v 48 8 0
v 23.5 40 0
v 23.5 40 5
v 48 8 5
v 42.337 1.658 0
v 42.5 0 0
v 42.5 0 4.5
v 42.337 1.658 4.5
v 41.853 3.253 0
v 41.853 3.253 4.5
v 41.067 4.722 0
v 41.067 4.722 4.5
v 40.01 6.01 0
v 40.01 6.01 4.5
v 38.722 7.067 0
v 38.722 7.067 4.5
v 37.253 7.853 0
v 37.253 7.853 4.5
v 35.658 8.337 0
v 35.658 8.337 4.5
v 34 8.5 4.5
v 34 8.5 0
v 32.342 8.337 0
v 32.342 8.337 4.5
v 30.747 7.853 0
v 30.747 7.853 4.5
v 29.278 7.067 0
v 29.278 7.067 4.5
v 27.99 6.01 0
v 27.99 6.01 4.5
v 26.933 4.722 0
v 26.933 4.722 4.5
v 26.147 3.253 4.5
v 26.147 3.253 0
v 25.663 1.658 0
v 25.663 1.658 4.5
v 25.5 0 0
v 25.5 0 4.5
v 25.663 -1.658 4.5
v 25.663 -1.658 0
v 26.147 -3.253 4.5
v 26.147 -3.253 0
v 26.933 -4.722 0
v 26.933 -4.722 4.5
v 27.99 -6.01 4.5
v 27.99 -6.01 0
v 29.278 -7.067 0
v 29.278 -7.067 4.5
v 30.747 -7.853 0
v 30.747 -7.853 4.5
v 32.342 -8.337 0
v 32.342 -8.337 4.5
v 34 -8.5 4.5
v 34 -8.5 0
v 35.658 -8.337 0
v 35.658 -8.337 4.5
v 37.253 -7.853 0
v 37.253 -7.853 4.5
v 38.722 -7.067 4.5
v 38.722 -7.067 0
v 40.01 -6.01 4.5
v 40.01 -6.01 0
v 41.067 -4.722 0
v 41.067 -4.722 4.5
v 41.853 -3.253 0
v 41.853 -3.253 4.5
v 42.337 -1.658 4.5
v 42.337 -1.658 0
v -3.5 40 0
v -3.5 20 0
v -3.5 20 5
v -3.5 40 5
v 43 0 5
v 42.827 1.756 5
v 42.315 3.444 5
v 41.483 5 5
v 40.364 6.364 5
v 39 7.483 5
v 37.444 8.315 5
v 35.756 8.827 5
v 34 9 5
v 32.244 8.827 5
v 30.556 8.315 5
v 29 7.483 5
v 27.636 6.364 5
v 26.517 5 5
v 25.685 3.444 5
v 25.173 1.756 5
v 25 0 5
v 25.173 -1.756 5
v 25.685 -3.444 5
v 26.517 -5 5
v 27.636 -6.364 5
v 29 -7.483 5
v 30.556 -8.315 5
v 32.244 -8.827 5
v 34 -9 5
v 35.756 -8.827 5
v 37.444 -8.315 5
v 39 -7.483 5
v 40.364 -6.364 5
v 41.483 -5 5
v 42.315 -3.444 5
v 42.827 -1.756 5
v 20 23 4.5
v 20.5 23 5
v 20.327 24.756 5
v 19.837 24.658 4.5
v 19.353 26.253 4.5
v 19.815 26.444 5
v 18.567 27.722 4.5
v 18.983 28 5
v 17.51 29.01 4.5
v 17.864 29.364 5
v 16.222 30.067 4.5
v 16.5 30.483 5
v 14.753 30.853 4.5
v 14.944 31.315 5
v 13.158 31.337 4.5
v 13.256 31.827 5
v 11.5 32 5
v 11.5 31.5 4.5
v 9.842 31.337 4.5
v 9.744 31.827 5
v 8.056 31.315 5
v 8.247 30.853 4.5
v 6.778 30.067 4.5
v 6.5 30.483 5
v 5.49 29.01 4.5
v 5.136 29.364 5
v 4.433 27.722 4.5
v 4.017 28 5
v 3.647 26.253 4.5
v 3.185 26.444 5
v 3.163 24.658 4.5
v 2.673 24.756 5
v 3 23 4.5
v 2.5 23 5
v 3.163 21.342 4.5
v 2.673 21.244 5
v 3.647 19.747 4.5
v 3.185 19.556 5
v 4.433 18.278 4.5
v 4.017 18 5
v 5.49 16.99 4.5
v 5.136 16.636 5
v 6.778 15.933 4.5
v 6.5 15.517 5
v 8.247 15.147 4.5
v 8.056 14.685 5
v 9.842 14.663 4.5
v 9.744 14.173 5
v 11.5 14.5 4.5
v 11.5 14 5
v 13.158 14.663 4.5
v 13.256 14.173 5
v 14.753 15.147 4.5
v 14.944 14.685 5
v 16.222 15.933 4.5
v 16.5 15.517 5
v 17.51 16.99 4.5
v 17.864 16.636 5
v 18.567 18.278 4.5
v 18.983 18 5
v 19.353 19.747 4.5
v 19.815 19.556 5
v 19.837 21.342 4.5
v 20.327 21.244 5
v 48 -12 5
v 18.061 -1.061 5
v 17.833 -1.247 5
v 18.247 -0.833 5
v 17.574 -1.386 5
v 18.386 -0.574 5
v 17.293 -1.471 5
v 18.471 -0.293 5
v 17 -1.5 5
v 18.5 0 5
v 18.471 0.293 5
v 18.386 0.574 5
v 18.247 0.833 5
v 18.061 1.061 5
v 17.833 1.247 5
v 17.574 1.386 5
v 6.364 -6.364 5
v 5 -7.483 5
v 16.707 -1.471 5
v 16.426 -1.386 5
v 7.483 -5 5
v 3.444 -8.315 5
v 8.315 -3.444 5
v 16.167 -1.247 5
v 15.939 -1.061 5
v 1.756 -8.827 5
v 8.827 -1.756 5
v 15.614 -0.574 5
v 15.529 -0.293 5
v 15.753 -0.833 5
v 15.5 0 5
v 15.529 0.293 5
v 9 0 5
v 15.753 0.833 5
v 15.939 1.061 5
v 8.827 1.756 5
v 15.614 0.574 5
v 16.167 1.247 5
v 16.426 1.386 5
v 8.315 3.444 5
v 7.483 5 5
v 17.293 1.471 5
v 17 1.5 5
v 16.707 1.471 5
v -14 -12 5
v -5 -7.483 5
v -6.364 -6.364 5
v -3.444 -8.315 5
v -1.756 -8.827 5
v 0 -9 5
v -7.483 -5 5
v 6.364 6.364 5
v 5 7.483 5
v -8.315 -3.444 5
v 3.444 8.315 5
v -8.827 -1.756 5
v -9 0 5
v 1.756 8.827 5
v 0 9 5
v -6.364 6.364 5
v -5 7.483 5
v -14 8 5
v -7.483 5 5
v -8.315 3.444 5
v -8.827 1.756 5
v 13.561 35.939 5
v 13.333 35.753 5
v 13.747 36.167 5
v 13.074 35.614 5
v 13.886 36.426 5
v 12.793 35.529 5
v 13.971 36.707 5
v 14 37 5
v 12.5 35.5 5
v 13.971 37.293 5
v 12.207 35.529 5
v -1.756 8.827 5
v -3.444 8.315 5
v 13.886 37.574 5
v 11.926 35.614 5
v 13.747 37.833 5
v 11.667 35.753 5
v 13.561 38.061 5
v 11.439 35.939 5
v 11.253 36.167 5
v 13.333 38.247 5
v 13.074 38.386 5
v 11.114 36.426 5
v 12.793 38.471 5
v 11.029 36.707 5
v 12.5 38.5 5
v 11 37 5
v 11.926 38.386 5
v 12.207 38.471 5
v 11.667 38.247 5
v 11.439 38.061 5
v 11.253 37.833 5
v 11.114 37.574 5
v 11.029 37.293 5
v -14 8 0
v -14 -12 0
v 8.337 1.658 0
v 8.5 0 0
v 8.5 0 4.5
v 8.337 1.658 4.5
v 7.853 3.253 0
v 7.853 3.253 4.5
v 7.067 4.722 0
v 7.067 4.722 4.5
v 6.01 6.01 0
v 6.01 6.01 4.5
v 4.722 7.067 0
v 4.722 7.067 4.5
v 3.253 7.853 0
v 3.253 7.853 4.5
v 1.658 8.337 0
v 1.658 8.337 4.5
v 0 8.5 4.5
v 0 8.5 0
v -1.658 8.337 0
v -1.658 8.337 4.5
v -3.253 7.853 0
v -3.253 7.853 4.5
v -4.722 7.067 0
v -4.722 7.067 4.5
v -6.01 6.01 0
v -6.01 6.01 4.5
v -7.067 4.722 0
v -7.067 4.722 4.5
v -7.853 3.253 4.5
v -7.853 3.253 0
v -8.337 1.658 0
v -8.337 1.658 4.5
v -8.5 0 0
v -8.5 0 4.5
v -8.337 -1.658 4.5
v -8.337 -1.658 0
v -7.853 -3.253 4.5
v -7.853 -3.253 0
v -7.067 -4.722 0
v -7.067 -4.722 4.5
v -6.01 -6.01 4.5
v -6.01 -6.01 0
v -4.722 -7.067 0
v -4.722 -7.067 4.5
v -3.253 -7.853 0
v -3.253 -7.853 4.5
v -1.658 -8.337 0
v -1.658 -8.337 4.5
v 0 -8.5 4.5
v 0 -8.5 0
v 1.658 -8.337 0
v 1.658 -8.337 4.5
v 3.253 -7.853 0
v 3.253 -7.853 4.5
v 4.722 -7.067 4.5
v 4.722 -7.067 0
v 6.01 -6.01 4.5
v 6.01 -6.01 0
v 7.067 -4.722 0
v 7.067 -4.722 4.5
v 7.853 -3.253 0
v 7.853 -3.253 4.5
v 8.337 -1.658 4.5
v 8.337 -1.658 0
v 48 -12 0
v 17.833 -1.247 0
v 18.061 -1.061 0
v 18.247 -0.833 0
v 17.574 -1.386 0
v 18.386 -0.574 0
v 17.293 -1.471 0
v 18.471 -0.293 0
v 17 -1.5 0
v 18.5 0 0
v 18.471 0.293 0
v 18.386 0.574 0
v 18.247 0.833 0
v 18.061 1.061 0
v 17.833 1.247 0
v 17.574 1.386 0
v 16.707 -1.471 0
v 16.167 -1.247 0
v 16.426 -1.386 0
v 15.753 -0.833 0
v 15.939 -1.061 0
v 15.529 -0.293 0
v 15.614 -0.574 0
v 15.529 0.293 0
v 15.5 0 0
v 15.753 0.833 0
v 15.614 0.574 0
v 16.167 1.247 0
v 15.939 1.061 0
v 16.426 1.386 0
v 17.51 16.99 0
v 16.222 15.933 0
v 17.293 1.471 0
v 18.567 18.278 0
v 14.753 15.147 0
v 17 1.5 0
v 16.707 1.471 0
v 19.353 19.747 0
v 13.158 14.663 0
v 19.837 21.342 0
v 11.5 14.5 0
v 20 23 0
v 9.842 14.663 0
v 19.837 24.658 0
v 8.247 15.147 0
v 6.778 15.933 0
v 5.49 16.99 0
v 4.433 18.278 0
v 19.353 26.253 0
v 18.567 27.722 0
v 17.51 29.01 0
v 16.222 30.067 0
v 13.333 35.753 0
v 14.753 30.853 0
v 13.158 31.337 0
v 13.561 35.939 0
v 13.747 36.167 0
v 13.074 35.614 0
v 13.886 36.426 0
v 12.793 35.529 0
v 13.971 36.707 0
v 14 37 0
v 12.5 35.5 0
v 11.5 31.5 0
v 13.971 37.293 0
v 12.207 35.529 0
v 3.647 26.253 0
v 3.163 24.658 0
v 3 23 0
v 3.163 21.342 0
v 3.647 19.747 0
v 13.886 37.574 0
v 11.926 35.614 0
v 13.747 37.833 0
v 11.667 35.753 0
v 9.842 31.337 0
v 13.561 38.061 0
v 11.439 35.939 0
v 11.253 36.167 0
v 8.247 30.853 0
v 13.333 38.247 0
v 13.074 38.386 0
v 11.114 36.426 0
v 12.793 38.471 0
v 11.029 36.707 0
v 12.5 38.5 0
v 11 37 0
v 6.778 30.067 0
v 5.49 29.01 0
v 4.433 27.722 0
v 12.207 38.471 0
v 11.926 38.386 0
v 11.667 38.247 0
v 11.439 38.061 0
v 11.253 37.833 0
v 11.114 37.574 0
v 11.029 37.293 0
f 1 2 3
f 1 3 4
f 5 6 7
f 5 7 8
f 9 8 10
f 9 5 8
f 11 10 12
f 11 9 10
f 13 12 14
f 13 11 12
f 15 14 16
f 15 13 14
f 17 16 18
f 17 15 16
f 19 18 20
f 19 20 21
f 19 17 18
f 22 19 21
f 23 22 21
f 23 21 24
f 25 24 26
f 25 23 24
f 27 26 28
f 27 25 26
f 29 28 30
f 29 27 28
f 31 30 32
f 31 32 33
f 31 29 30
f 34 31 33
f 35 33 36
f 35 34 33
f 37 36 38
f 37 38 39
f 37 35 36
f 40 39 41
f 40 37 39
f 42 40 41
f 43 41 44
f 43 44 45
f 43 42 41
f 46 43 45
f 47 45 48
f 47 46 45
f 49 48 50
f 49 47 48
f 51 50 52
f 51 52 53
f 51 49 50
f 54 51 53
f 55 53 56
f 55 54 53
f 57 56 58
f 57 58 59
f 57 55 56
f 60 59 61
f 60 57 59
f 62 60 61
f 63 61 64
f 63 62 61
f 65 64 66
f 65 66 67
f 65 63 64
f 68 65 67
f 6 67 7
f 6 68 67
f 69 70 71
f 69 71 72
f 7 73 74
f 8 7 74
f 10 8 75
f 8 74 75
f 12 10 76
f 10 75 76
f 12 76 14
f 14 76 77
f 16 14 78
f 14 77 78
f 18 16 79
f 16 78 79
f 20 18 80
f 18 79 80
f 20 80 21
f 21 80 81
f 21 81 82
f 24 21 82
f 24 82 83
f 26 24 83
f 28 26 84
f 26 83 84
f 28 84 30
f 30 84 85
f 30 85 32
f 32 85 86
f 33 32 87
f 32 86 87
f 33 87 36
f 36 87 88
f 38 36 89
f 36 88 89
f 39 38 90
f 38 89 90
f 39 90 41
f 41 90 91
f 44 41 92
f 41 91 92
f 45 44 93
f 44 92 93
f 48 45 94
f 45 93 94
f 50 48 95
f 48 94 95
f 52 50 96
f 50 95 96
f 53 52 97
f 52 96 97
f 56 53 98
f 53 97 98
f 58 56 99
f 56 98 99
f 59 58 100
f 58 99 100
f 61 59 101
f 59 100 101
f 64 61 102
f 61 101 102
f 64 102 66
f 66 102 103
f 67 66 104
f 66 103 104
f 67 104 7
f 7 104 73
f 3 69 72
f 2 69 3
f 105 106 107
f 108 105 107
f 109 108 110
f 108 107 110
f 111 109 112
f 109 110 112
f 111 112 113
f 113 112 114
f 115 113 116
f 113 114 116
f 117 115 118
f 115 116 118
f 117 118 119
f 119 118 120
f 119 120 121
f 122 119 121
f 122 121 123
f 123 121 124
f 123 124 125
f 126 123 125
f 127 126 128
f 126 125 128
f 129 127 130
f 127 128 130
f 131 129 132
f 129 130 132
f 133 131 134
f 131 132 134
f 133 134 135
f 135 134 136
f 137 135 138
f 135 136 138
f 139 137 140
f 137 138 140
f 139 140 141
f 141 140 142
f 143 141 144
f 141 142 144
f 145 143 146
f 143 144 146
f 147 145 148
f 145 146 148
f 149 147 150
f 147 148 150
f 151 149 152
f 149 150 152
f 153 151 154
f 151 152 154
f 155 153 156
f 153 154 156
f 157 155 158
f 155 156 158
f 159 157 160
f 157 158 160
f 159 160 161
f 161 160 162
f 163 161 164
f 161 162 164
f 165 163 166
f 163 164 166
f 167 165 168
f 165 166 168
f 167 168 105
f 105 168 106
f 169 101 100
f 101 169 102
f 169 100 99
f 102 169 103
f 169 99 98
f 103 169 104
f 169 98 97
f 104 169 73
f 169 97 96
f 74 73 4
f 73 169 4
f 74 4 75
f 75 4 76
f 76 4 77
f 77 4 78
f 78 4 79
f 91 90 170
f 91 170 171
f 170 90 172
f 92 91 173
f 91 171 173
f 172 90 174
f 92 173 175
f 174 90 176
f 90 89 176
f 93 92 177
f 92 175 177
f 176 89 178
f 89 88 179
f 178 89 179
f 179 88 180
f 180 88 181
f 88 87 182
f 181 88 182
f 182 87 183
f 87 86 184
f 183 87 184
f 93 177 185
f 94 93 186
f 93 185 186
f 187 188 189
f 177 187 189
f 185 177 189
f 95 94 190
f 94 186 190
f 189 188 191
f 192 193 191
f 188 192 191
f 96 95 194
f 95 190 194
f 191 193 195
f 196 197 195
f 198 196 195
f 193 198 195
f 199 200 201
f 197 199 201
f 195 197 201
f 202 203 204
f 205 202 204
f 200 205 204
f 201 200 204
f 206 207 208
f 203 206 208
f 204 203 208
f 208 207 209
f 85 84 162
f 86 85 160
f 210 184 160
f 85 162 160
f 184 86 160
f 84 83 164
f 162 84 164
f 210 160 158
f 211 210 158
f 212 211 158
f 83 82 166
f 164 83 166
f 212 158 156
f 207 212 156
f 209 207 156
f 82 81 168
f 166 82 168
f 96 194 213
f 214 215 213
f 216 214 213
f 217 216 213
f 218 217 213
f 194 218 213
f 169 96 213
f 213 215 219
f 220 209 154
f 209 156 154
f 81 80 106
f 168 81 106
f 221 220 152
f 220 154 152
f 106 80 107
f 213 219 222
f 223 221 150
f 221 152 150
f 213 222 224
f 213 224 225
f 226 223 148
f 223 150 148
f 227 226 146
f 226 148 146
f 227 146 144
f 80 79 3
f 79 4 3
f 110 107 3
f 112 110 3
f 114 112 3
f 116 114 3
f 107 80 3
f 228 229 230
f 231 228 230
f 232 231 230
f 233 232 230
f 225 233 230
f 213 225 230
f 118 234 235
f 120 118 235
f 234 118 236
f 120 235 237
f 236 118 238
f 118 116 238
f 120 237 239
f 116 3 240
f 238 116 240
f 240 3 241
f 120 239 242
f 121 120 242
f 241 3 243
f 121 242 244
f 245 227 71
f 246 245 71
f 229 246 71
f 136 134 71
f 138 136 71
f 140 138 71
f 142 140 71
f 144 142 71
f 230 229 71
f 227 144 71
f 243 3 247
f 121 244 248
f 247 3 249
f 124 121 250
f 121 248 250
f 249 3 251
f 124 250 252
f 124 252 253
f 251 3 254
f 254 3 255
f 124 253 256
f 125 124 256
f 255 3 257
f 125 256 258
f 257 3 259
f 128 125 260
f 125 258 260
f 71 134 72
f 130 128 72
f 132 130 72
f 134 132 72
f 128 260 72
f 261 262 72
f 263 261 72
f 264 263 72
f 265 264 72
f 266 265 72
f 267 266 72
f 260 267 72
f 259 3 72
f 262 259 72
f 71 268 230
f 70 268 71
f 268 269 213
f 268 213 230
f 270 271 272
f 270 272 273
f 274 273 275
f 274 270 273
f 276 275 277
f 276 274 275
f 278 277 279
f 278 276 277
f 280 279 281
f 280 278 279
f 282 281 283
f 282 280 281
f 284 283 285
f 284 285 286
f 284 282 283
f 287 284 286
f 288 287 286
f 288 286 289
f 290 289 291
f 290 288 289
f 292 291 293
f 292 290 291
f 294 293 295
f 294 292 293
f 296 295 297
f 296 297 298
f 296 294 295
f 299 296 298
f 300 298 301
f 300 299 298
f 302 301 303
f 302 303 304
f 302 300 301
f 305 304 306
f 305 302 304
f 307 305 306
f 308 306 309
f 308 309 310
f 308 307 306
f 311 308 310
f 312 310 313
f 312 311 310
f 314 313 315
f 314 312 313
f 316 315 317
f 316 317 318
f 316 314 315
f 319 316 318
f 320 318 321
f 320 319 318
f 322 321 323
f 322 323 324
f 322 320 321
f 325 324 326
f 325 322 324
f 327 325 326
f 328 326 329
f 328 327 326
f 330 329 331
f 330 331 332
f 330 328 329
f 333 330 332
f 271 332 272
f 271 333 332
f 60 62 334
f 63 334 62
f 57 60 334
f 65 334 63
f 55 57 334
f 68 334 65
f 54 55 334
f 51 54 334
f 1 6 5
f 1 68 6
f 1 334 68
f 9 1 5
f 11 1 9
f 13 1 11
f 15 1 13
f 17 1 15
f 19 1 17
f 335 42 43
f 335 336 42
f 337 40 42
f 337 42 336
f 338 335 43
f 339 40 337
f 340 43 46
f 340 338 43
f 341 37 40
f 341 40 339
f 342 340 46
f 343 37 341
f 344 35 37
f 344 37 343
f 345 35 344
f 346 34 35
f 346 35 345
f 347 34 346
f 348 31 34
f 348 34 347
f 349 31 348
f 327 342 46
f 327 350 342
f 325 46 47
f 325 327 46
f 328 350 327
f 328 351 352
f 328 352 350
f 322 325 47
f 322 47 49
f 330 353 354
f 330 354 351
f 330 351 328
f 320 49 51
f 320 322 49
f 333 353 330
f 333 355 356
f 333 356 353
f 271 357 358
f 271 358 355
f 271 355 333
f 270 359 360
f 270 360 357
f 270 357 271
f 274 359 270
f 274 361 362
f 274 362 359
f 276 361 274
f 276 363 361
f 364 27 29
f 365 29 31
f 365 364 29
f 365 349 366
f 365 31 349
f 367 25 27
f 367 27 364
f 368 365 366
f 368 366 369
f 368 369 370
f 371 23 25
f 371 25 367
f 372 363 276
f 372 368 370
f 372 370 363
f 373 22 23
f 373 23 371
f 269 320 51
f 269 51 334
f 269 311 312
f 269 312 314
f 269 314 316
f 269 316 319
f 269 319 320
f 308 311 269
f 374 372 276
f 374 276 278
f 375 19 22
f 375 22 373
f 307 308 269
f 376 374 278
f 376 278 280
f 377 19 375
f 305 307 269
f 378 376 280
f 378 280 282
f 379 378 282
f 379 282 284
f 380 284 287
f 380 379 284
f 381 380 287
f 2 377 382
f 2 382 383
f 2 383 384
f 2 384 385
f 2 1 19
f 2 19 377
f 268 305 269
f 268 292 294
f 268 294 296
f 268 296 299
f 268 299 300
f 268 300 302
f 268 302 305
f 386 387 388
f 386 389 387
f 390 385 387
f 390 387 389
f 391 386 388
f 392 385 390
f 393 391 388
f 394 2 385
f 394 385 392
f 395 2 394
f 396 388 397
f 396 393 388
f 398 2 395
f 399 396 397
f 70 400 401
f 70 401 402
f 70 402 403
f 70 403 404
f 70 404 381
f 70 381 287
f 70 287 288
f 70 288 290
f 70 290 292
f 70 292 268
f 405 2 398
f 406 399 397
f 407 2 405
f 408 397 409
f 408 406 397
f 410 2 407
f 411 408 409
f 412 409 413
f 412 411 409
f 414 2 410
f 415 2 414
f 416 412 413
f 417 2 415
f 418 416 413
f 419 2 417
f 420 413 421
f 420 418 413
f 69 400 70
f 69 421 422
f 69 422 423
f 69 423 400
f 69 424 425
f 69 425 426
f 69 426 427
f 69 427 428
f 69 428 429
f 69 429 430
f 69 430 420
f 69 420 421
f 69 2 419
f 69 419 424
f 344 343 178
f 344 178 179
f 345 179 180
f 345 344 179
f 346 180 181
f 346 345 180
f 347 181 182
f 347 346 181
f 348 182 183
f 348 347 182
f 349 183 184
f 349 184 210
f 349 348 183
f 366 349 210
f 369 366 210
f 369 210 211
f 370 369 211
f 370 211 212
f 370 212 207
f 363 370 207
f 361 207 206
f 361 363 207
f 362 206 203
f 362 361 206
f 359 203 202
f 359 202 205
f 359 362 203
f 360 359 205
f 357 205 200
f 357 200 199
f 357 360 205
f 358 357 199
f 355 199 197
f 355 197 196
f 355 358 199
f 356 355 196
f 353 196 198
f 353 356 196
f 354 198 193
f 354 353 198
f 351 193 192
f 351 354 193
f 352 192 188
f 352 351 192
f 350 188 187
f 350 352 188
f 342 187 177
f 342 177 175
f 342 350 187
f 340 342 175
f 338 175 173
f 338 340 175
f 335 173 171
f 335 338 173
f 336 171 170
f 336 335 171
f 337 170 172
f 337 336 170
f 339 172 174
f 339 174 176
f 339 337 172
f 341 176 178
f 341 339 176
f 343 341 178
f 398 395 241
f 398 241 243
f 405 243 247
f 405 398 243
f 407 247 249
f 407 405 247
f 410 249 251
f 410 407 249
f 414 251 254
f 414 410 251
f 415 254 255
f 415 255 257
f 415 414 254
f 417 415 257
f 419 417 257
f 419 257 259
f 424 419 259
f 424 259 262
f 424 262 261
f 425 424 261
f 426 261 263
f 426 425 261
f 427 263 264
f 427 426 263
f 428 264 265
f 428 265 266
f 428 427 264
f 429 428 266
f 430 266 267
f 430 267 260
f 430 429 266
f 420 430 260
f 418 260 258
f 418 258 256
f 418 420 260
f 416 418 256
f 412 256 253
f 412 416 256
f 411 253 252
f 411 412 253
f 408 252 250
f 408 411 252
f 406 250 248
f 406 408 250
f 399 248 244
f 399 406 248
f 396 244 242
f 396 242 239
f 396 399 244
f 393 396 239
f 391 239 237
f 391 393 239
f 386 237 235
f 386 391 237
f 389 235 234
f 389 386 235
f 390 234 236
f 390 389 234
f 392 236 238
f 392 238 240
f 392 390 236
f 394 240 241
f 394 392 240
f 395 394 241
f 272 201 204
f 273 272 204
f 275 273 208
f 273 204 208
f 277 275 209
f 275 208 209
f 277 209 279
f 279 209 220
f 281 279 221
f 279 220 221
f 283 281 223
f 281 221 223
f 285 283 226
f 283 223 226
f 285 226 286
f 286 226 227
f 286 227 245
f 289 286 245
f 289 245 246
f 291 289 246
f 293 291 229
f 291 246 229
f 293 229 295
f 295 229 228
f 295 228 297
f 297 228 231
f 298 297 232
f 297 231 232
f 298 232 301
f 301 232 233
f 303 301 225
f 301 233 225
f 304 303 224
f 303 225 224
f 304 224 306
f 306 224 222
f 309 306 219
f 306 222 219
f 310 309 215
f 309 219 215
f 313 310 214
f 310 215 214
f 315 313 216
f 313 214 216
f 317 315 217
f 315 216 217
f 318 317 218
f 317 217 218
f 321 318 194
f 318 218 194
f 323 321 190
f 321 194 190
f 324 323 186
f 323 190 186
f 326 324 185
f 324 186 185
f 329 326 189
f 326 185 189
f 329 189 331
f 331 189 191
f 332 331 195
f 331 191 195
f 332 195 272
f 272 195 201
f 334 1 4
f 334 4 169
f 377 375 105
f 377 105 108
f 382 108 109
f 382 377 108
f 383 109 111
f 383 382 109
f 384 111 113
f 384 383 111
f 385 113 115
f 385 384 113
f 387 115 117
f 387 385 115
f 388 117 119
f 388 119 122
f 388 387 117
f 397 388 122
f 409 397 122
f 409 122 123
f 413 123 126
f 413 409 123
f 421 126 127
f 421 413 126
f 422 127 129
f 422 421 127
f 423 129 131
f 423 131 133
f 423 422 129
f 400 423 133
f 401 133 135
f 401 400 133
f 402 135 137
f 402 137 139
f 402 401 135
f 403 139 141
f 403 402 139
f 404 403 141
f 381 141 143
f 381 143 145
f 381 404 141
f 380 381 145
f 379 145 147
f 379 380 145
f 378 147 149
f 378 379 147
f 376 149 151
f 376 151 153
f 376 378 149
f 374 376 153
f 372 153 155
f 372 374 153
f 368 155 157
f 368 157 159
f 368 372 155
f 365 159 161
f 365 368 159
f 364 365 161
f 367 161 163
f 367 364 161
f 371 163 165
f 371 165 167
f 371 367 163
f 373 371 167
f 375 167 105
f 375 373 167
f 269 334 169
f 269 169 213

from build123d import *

# Parameters (mm, degrees)
SZKIC1_R                    = 8.5
SZKIC1_R_2                  = 1.5
DODANIE_WYCI_GNI_CIE1_DEPTH = 5
SFAZOWANIE2_SIZE            = 0.5


with BuildPart() as part:
    # Szkic1 → Dodanie-wyciągnięcie1 (new body)
    with BuildSketch(Plane.XY):
        Polygon((-14, -12), (-14, 8), (-3.5, 20), (-3.5, 40), (23.5, 40), (48, 8), (48, -12), align=None)
        Circle(SZKIC1_R, mode=Mode.SUBTRACT)
        with Locations((34, 0)):
            Circle(SZKIC1_R, mode=Mode.SUBTRACT)
        with Locations((11.5, 23)):
            Circle(SZKIC1_R, mode=Mode.SUBTRACT)
        with Locations((12.5, 37)):
            Circle(SZKIC1_R_2, mode=Mode.SUBTRACT)
        with Locations((17, 0)):
            Circle(SZKIC1_R_2, mode=Mode.SUBTRACT)
    extrude(amount=DODANIE_WYCI_GNI_CIE1_DEPTH)

    # Sfazowanie2
    sfazowanie2_edges = [part.edges().sort_by_distance(p)[0] for p in [
        (-8.5, 0, 5),
        (25.5, 0, 5),
        (3, 23, 5),
    ]]
    chamfer(sfazowanie2_edges, length=SFAZOWANIE2_SIZE)


solid = part.part
